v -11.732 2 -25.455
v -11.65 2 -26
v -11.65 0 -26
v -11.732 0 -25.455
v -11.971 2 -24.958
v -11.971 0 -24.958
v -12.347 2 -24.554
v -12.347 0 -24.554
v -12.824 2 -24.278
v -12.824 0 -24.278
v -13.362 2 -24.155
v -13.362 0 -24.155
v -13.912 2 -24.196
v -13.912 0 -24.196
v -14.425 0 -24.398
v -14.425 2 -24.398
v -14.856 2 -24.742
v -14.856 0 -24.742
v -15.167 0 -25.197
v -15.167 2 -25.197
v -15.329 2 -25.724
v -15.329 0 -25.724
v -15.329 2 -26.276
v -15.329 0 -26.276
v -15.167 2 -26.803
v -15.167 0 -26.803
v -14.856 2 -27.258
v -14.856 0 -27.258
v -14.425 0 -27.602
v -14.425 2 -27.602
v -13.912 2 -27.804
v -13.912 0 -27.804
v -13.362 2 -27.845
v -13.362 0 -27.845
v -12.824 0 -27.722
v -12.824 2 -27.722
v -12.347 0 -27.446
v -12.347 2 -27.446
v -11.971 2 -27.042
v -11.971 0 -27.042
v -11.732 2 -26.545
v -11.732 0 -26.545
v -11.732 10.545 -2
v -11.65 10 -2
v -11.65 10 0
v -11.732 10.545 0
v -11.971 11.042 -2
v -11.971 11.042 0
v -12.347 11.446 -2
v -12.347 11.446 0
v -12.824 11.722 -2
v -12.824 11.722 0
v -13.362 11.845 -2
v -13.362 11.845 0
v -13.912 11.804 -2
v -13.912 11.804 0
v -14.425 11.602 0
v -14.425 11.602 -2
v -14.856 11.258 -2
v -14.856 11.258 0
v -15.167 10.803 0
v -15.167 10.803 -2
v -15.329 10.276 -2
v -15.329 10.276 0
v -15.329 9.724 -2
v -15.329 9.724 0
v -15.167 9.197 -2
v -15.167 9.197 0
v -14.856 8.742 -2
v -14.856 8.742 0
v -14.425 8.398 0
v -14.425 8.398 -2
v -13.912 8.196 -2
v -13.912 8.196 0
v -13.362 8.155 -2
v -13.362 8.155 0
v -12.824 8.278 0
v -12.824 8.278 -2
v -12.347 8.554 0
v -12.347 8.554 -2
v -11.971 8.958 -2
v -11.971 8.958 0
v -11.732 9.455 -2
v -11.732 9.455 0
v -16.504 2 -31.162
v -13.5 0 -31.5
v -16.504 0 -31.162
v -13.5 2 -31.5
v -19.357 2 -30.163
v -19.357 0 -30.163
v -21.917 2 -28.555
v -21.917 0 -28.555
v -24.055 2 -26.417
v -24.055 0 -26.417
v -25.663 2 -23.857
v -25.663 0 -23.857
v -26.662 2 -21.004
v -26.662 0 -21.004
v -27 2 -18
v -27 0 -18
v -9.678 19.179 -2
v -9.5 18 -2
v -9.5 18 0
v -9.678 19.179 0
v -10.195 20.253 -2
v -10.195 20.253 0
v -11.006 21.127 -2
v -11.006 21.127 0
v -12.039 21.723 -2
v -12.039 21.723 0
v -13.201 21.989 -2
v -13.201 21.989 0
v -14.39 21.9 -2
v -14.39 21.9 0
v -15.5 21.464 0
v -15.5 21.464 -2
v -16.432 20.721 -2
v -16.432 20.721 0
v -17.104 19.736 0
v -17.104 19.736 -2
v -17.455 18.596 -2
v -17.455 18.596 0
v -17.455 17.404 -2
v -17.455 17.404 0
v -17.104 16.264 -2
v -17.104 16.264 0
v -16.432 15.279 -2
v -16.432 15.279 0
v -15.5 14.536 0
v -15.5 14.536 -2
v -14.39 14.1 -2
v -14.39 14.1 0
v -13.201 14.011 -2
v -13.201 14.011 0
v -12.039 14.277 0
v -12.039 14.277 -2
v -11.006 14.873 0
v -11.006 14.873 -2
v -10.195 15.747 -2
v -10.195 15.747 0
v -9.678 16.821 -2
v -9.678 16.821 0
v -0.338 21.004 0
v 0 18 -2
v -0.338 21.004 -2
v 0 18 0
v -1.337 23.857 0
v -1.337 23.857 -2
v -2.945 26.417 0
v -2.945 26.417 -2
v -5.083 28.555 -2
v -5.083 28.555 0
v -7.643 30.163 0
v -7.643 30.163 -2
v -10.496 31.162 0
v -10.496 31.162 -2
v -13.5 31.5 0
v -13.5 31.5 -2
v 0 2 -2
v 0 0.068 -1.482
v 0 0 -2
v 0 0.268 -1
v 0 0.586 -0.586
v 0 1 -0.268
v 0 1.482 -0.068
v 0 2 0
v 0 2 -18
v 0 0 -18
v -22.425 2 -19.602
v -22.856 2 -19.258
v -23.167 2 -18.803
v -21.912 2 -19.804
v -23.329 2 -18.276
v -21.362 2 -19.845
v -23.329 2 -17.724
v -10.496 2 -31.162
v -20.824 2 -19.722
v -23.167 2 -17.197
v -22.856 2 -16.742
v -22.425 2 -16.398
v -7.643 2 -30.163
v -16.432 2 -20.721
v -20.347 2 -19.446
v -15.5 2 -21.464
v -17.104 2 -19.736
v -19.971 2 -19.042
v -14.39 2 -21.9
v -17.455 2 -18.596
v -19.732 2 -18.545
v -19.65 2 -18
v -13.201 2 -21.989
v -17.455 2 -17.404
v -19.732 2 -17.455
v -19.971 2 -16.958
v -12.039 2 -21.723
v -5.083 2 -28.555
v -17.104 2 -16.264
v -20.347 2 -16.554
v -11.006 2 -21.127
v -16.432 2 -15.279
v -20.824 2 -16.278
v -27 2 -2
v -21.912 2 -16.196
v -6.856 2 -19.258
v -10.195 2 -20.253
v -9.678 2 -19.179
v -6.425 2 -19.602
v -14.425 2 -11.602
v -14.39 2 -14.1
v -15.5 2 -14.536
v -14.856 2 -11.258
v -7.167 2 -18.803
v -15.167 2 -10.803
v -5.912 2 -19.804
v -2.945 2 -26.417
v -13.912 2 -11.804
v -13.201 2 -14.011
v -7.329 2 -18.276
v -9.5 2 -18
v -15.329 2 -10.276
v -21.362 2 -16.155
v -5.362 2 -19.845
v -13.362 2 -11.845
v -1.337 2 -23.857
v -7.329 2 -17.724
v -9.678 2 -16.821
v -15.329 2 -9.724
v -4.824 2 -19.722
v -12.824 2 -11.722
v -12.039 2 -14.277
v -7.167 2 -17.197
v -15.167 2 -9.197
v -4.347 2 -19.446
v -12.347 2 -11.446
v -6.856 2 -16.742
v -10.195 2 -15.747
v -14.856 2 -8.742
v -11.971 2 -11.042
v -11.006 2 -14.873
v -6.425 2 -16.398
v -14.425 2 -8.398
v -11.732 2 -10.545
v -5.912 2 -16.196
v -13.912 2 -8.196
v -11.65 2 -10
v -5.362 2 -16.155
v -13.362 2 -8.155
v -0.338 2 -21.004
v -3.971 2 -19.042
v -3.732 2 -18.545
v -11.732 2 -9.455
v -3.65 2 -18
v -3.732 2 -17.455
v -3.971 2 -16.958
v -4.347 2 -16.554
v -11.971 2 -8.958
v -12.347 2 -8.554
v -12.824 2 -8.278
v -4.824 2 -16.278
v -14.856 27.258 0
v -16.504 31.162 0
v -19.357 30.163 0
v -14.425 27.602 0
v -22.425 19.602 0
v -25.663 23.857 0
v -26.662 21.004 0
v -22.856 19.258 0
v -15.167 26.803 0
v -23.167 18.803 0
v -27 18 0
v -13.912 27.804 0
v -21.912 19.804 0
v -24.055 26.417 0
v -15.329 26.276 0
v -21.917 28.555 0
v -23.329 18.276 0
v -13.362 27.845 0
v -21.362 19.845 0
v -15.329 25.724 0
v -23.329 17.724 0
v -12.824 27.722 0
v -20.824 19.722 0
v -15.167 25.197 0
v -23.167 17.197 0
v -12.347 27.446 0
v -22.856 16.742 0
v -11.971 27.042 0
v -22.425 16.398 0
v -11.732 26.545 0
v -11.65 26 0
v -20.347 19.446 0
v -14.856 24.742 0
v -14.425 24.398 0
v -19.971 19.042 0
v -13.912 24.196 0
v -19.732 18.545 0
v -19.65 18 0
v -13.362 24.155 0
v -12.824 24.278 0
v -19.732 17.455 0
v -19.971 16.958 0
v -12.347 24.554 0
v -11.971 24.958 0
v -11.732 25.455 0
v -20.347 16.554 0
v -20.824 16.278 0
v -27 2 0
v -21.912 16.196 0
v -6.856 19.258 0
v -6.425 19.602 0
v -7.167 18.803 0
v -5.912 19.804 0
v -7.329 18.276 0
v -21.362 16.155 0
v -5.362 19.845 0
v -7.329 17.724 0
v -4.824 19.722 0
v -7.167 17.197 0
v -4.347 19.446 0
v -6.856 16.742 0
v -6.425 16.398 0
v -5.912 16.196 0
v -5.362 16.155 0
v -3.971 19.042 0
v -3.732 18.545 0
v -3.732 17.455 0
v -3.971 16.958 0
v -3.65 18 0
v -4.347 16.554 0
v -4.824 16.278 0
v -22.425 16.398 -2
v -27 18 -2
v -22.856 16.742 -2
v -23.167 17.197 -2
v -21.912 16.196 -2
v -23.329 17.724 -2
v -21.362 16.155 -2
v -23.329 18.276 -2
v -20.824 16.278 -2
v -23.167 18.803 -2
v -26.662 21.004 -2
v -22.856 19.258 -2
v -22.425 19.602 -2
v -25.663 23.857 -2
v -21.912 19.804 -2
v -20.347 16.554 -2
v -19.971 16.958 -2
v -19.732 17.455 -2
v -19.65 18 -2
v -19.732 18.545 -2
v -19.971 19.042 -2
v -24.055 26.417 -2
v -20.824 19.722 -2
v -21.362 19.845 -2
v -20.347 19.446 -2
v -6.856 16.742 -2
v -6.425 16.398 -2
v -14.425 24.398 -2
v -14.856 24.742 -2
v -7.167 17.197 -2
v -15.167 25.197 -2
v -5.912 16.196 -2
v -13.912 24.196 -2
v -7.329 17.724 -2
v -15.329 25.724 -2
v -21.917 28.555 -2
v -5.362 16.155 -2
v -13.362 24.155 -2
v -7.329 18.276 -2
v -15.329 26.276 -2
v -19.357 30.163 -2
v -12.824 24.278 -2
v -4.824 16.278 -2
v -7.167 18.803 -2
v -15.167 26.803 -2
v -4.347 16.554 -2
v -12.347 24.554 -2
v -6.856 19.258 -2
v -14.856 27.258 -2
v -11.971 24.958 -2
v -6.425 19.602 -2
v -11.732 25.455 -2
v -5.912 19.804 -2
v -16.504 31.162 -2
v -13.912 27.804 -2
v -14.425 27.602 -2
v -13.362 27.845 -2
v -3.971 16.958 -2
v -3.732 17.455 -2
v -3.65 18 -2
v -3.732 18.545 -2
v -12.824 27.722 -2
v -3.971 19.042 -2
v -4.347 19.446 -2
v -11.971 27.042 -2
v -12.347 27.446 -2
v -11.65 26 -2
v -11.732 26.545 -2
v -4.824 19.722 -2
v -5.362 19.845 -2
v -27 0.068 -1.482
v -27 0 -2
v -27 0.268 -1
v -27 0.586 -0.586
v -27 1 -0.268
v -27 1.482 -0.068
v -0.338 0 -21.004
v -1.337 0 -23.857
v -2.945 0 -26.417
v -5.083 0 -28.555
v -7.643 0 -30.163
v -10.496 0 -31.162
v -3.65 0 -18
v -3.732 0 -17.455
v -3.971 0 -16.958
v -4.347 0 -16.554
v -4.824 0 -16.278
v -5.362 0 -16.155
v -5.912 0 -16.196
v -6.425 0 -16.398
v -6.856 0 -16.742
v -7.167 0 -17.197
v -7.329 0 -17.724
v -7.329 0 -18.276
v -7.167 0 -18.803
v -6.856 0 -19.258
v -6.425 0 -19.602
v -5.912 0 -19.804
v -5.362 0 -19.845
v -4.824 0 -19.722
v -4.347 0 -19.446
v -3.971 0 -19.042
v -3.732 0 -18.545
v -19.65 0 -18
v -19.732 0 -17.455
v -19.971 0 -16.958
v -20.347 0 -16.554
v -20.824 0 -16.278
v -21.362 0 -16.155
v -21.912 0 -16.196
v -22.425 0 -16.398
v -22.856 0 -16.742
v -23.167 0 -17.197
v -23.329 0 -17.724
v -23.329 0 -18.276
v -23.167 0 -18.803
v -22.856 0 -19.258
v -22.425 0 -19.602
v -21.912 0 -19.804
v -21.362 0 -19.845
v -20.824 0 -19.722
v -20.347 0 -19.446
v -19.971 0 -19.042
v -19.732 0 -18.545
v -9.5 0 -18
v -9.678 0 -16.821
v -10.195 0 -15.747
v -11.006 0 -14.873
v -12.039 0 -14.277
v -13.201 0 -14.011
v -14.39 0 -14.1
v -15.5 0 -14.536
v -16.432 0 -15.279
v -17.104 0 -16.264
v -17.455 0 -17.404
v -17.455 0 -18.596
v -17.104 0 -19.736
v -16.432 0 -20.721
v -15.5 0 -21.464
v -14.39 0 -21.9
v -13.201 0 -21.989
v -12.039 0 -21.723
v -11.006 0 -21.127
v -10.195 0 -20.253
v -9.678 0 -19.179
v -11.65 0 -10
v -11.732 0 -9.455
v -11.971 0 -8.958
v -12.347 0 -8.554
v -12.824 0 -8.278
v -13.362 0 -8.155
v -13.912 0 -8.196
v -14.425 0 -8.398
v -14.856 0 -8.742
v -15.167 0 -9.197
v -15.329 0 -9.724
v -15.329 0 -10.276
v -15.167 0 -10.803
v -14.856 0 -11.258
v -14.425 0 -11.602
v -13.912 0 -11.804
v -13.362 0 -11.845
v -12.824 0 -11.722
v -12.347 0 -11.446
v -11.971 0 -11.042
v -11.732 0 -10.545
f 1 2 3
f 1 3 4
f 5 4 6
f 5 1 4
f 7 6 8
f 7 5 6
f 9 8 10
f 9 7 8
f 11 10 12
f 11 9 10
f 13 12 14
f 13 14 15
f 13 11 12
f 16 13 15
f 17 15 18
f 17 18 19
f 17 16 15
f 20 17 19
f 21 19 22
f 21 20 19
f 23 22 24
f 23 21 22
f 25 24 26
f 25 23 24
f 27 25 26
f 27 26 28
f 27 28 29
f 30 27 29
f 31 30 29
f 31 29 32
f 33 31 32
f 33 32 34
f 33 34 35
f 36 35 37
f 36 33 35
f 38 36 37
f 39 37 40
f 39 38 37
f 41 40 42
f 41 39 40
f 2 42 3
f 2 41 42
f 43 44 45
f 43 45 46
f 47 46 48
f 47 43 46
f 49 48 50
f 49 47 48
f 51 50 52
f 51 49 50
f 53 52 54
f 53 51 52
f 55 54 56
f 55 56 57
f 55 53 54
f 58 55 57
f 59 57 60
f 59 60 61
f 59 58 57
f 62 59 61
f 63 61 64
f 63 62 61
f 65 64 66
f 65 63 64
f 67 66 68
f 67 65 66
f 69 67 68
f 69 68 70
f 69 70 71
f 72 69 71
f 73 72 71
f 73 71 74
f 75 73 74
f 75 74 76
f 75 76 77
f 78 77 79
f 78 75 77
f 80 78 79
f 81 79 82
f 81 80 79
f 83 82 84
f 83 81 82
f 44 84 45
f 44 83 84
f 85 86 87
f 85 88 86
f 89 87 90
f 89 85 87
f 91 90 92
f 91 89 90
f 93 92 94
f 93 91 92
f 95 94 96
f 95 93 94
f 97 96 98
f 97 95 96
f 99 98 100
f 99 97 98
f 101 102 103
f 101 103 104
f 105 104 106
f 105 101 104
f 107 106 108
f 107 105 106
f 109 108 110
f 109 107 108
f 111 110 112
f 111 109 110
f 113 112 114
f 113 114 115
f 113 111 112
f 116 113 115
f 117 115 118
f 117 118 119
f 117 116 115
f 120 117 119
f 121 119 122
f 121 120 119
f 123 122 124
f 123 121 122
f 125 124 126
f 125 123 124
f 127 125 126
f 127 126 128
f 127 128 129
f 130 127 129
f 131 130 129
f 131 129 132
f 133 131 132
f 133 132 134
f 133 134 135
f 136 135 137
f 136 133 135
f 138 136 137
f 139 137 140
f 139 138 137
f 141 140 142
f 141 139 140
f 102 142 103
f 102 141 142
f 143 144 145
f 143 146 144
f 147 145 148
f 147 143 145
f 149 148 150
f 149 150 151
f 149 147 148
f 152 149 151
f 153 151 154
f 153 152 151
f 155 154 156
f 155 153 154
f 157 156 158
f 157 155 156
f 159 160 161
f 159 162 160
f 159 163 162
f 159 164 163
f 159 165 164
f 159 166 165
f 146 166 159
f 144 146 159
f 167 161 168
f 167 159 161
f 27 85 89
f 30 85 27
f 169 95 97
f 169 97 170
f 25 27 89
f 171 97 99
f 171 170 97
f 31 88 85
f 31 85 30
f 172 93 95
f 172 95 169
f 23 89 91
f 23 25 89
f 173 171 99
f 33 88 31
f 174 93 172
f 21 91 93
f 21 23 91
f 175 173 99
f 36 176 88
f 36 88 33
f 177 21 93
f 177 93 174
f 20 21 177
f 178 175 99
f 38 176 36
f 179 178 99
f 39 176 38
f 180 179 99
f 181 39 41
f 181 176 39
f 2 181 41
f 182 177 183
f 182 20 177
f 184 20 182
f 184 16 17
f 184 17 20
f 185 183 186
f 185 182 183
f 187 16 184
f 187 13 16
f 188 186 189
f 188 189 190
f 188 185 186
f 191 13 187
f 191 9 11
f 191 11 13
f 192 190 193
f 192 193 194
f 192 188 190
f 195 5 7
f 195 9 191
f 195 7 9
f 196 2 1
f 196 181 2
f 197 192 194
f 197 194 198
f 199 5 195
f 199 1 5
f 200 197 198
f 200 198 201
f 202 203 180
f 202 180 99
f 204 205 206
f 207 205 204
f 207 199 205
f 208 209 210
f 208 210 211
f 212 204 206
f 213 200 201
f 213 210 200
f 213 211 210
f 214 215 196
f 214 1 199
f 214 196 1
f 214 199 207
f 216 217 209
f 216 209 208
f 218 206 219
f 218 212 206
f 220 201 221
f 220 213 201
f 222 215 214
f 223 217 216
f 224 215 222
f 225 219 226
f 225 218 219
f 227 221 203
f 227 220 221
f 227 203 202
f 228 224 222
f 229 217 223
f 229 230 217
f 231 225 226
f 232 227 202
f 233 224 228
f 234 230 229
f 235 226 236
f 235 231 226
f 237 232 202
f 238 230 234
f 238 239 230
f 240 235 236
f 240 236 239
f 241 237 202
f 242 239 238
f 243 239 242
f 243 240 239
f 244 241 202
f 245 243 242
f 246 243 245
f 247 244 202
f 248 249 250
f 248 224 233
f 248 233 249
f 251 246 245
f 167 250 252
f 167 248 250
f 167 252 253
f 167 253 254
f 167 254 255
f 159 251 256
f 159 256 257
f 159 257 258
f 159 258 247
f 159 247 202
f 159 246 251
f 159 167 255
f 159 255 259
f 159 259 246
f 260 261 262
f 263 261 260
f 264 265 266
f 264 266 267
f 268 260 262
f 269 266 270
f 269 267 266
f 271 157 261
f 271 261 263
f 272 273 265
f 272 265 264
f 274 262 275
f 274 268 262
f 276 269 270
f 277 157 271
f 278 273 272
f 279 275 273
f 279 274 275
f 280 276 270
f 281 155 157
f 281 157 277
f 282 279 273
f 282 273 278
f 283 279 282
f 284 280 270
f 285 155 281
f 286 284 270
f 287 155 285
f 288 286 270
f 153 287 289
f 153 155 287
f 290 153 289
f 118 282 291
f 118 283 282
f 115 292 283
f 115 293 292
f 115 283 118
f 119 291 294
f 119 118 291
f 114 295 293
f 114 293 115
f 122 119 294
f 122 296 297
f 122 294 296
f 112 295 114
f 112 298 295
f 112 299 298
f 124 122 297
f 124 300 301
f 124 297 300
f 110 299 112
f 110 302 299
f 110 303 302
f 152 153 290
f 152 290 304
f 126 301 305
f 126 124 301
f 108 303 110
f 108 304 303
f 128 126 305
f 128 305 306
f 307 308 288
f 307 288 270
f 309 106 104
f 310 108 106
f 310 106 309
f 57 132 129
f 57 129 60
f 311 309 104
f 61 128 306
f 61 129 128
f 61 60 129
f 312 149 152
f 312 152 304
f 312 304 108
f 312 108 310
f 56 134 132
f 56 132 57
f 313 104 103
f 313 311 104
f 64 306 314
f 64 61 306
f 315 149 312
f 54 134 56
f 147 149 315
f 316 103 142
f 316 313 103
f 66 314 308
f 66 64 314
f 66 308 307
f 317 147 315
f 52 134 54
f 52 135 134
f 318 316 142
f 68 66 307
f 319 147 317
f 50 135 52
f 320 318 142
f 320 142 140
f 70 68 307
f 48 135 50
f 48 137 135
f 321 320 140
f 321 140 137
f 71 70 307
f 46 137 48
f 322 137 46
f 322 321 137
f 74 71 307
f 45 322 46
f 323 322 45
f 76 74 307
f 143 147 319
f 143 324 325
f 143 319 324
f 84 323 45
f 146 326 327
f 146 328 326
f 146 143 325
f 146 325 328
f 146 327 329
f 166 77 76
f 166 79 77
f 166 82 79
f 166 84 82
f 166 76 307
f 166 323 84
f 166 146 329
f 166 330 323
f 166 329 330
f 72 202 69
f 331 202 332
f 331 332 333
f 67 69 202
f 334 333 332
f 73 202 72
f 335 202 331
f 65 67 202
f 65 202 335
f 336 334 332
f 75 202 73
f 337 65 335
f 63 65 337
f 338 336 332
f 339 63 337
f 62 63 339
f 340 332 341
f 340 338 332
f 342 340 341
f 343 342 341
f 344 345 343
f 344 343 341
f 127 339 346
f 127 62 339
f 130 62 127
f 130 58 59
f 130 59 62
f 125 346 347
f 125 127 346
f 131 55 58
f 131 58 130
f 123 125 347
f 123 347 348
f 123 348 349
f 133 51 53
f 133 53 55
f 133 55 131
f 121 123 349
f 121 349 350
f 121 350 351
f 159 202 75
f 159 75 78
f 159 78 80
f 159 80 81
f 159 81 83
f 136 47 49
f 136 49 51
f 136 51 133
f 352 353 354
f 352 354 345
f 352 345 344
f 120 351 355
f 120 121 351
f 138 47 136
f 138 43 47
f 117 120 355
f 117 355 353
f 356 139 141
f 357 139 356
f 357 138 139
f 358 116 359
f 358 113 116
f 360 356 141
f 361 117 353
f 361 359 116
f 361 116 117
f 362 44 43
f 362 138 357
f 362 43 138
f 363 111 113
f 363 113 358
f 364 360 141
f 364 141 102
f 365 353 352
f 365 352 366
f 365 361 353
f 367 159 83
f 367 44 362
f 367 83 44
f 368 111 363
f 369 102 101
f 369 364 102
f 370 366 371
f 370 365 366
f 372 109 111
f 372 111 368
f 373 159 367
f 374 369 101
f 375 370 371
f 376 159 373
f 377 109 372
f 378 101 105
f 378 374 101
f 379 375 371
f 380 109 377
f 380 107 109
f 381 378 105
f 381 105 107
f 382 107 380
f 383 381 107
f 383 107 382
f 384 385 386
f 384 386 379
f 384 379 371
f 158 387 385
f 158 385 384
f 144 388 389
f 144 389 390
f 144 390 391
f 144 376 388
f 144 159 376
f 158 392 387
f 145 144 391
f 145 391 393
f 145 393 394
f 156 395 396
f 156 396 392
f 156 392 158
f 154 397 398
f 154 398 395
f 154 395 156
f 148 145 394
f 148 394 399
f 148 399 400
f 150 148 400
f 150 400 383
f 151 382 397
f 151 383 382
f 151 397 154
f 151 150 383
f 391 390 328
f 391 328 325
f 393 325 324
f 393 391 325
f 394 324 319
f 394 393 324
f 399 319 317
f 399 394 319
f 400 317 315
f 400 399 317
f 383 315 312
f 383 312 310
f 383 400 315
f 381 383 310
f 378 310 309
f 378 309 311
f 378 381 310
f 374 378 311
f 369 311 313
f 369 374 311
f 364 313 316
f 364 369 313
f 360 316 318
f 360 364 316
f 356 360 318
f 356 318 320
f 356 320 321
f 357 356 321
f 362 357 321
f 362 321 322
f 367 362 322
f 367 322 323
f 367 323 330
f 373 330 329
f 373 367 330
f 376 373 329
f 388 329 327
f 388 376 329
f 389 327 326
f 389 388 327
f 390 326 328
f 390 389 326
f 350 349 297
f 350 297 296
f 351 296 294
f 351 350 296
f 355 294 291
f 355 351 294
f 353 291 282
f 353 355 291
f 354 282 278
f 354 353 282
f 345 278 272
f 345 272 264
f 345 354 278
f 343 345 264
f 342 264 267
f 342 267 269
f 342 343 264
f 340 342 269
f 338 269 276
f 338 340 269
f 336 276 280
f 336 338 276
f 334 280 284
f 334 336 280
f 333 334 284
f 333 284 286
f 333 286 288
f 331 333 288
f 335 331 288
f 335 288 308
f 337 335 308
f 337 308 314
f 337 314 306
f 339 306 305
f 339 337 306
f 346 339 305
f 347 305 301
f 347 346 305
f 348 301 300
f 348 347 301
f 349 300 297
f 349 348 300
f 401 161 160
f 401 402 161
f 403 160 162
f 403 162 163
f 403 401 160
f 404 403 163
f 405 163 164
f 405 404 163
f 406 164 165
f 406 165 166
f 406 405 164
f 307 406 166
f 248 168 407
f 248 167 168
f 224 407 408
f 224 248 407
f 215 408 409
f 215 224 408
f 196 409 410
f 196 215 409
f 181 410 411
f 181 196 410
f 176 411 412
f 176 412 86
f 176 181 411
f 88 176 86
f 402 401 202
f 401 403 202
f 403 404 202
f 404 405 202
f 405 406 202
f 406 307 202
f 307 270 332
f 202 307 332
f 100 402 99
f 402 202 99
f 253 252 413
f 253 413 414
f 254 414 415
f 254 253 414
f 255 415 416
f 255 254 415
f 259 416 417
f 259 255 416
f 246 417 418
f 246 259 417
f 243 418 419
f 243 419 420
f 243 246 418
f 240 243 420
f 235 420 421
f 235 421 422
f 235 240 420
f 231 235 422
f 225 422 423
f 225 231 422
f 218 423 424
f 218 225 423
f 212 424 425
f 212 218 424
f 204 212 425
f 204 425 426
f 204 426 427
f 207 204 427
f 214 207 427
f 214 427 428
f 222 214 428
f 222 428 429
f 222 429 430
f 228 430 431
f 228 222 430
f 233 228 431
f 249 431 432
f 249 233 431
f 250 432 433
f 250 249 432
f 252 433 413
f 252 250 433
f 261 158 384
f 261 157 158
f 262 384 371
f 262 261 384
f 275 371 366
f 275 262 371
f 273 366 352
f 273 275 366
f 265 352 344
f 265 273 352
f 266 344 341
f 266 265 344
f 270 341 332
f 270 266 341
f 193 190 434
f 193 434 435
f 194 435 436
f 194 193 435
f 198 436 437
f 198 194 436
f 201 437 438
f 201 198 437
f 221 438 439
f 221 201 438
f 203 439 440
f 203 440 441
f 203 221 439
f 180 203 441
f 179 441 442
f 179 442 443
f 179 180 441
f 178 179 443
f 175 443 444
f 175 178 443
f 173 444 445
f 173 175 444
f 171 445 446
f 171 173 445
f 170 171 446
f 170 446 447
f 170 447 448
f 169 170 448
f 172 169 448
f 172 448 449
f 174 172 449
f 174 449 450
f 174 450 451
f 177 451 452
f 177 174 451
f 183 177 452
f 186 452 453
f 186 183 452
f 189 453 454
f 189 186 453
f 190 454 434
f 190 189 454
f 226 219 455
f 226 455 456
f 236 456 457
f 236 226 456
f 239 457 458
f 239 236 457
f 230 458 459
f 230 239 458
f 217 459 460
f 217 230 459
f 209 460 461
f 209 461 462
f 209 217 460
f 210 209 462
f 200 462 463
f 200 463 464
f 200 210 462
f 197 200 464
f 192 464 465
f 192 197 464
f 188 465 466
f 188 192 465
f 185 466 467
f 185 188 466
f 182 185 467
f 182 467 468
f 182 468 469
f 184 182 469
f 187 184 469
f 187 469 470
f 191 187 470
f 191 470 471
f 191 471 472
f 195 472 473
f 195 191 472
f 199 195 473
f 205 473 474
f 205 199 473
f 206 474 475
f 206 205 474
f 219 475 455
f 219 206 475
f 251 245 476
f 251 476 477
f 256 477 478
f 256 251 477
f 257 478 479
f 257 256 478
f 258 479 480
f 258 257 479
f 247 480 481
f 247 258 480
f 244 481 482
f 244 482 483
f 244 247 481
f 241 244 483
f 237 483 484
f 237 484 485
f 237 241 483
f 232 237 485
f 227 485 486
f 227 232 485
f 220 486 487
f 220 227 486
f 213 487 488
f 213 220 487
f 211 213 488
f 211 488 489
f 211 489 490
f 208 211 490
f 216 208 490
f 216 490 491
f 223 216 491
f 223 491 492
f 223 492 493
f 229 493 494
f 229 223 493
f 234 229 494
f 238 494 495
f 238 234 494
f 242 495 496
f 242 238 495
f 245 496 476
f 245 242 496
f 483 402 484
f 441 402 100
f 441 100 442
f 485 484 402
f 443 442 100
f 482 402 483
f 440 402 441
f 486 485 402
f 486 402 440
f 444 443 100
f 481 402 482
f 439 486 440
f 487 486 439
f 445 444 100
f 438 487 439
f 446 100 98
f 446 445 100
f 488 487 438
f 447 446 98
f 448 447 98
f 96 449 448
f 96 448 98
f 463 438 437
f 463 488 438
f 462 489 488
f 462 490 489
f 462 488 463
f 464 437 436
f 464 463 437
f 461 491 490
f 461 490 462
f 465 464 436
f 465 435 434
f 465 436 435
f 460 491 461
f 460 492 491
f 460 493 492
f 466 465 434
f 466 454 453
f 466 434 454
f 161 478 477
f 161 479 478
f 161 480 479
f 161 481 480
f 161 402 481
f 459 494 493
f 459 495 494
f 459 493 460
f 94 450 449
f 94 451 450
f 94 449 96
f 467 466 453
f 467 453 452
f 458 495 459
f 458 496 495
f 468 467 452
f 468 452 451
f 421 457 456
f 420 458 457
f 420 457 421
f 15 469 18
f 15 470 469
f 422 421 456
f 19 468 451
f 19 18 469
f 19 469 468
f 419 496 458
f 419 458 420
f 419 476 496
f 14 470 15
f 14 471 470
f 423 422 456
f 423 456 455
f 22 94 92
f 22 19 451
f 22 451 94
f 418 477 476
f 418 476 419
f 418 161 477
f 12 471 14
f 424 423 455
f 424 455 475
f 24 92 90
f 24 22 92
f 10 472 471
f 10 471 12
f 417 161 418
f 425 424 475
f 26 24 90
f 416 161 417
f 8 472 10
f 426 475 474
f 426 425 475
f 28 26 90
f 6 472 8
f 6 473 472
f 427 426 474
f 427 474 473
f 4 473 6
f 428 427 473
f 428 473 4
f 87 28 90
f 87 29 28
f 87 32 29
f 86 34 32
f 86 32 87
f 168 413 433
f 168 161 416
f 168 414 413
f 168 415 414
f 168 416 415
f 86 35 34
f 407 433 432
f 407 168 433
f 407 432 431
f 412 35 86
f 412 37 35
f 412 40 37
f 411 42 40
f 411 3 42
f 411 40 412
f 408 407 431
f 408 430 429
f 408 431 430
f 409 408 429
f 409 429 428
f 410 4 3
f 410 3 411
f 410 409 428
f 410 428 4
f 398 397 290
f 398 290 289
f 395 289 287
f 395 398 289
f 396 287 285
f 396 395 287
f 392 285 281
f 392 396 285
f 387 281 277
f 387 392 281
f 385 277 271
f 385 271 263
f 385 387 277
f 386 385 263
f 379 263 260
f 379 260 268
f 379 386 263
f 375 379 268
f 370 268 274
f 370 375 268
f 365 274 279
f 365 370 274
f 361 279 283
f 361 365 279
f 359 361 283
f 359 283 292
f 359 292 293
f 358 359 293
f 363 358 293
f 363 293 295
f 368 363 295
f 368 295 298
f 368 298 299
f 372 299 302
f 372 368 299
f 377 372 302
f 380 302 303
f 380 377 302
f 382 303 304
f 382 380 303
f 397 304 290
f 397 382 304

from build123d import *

# Parameters (mm, degrees)
EXTRUDE1_DEPTH           = 27
CUT_EXTRUDE1_START       = -2
CUT_EXTRUDE1_OUTLINE_R   = 4
CUT_EXTRUDE1_OUTLINE_R_2 = 1.85
CUT_EXTRUDE1_DEPTH       = 2
CUT_EXTRUDE2_START       = -2
CUT_EXTRUDE2_OUTLINE_R   = 4
CUT_EXTRUDE2_OUTLINE_R_2 = 1.85
CUT_EXTRUDE2_DEPTH       = 2
FILLET1_R                = 13.5
FILLET2_R                = 13.5
FILLET3_R                = 13.5
FILLET4_R                = 13.5
FILLET5_R                = 2


# Read off the part's stored shape, not the designer's step: Cut-Extrude1, Cut-Extrude2
with BuildPart() as part:
    # Sketch1 → Extrude1 (new body)
    with BuildSketch(Plane(origin=(0, 0, 0), x_dir=(0, 0, -1), z_dir=(1, 0, 0))):
        Polygon((0, 0), (31.5, 0), (31.5, 2), (2, 2), (2, 31.5), (0, 31.5), align=None)
    extrude(amount=-EXTRUDE1_DEPTH)

    # Cut-Extrude1 outline → Cut-Extrude1 (cut)
    with BuildSketch(Plane.XY.offset(CUT_EXTRUDE1_START)):
        with Locations((-13.5, 18)):
            Circle(CUT_EXTRUDE1_OUTLINE_R)
        with Locations((-5.5, 18)):
            Circle(CUT_EXTRUDE1_OUTLINE_R_2)
        with Locations((-21.5, 18)):
            Circle(CUT_EXTRUDE1_OUTLINE_R_2)
        with Locations((-13.5, 10)):
            Circle(CUT_EXTRUDE1_OUTLINE_R_2)
        with Locations((-13.5, 26)):
            Circle(CUT_EXTRUDE1_OUTLINE_R_2)
    extrude(amount=CUT_EXTRUDE1_DEPTH, mode=Mode.SUBTRACT)

    # Cut-Extrude2 outline → Cut-Extrude2 (cut)
    with BuildSketch(Plane.XZ.offset(CUT_EXTRUDE2_START)):
        with Locations((-13.5, -18)):
            Circle(CUT_EXTRUDE2_OUTLINE_R)
        with Locations((-5.5, -18)):
            Circle(CUT_EXTRUDE2_OUTLINE_R_2)
        with Locations((-21.5, -18)):
            Circle(CUT_EXTRUDE2_OUTLINE_R_2)
        with Locations((-13.5, -26)):
            Circle(CUT_EXTRUDE2_OUTLINE_R_2)
        with Locations((-13.5, -10)):
            Circle(CUT_EXTRUDE2_OUTLINE_R_2)
    extrude(amount=CUT_EXTRUDE2_DEPTH, mode=Mode.SUBTRACT)

    # Fillet1
    fillet1_edges = [part.edges().sort_by_distance(p)[0] for p in [
        (0, 31.5, -1),
    ]]
    fillet(fillet1_edges, radius=FILLET1_R)

    # Fillet2
    fillet2_edges = [part.edges().sort_by_distance(p)[0] for p in [
        (-27, 31.5, -1),
    ]]
    fillet(fillet2_edges, radius=FILLET2_R - 0.0001)  # a hair under: the kernel refuses the full size

    # Fillet3
    fillet3_edges = [part.edges().sort_by_distance(p)[0] for p in [
        (0, 1, -31.5),
    ]]
    fillet(fillet3_edges, radius=FILLET3_R)

    # Fillet4
    fillet4_edges = [part.edges().sort_by_distance(p)[0] for p in [
        (-27, 1, -31.5),
    ]]
    fillet(fillet4_edges, radius=FILLET4_R - 0.0001)  # a hair under: the kernel refuses the full size

    # Fillet5
    fillet5_edges = [part.edges().sort_by_distance(p)[0] for p in [
        (-13.5, 0, 0),
    ]]
    fillet(fillet5_edges, radius=FILLET5_R)


solid = part.part
